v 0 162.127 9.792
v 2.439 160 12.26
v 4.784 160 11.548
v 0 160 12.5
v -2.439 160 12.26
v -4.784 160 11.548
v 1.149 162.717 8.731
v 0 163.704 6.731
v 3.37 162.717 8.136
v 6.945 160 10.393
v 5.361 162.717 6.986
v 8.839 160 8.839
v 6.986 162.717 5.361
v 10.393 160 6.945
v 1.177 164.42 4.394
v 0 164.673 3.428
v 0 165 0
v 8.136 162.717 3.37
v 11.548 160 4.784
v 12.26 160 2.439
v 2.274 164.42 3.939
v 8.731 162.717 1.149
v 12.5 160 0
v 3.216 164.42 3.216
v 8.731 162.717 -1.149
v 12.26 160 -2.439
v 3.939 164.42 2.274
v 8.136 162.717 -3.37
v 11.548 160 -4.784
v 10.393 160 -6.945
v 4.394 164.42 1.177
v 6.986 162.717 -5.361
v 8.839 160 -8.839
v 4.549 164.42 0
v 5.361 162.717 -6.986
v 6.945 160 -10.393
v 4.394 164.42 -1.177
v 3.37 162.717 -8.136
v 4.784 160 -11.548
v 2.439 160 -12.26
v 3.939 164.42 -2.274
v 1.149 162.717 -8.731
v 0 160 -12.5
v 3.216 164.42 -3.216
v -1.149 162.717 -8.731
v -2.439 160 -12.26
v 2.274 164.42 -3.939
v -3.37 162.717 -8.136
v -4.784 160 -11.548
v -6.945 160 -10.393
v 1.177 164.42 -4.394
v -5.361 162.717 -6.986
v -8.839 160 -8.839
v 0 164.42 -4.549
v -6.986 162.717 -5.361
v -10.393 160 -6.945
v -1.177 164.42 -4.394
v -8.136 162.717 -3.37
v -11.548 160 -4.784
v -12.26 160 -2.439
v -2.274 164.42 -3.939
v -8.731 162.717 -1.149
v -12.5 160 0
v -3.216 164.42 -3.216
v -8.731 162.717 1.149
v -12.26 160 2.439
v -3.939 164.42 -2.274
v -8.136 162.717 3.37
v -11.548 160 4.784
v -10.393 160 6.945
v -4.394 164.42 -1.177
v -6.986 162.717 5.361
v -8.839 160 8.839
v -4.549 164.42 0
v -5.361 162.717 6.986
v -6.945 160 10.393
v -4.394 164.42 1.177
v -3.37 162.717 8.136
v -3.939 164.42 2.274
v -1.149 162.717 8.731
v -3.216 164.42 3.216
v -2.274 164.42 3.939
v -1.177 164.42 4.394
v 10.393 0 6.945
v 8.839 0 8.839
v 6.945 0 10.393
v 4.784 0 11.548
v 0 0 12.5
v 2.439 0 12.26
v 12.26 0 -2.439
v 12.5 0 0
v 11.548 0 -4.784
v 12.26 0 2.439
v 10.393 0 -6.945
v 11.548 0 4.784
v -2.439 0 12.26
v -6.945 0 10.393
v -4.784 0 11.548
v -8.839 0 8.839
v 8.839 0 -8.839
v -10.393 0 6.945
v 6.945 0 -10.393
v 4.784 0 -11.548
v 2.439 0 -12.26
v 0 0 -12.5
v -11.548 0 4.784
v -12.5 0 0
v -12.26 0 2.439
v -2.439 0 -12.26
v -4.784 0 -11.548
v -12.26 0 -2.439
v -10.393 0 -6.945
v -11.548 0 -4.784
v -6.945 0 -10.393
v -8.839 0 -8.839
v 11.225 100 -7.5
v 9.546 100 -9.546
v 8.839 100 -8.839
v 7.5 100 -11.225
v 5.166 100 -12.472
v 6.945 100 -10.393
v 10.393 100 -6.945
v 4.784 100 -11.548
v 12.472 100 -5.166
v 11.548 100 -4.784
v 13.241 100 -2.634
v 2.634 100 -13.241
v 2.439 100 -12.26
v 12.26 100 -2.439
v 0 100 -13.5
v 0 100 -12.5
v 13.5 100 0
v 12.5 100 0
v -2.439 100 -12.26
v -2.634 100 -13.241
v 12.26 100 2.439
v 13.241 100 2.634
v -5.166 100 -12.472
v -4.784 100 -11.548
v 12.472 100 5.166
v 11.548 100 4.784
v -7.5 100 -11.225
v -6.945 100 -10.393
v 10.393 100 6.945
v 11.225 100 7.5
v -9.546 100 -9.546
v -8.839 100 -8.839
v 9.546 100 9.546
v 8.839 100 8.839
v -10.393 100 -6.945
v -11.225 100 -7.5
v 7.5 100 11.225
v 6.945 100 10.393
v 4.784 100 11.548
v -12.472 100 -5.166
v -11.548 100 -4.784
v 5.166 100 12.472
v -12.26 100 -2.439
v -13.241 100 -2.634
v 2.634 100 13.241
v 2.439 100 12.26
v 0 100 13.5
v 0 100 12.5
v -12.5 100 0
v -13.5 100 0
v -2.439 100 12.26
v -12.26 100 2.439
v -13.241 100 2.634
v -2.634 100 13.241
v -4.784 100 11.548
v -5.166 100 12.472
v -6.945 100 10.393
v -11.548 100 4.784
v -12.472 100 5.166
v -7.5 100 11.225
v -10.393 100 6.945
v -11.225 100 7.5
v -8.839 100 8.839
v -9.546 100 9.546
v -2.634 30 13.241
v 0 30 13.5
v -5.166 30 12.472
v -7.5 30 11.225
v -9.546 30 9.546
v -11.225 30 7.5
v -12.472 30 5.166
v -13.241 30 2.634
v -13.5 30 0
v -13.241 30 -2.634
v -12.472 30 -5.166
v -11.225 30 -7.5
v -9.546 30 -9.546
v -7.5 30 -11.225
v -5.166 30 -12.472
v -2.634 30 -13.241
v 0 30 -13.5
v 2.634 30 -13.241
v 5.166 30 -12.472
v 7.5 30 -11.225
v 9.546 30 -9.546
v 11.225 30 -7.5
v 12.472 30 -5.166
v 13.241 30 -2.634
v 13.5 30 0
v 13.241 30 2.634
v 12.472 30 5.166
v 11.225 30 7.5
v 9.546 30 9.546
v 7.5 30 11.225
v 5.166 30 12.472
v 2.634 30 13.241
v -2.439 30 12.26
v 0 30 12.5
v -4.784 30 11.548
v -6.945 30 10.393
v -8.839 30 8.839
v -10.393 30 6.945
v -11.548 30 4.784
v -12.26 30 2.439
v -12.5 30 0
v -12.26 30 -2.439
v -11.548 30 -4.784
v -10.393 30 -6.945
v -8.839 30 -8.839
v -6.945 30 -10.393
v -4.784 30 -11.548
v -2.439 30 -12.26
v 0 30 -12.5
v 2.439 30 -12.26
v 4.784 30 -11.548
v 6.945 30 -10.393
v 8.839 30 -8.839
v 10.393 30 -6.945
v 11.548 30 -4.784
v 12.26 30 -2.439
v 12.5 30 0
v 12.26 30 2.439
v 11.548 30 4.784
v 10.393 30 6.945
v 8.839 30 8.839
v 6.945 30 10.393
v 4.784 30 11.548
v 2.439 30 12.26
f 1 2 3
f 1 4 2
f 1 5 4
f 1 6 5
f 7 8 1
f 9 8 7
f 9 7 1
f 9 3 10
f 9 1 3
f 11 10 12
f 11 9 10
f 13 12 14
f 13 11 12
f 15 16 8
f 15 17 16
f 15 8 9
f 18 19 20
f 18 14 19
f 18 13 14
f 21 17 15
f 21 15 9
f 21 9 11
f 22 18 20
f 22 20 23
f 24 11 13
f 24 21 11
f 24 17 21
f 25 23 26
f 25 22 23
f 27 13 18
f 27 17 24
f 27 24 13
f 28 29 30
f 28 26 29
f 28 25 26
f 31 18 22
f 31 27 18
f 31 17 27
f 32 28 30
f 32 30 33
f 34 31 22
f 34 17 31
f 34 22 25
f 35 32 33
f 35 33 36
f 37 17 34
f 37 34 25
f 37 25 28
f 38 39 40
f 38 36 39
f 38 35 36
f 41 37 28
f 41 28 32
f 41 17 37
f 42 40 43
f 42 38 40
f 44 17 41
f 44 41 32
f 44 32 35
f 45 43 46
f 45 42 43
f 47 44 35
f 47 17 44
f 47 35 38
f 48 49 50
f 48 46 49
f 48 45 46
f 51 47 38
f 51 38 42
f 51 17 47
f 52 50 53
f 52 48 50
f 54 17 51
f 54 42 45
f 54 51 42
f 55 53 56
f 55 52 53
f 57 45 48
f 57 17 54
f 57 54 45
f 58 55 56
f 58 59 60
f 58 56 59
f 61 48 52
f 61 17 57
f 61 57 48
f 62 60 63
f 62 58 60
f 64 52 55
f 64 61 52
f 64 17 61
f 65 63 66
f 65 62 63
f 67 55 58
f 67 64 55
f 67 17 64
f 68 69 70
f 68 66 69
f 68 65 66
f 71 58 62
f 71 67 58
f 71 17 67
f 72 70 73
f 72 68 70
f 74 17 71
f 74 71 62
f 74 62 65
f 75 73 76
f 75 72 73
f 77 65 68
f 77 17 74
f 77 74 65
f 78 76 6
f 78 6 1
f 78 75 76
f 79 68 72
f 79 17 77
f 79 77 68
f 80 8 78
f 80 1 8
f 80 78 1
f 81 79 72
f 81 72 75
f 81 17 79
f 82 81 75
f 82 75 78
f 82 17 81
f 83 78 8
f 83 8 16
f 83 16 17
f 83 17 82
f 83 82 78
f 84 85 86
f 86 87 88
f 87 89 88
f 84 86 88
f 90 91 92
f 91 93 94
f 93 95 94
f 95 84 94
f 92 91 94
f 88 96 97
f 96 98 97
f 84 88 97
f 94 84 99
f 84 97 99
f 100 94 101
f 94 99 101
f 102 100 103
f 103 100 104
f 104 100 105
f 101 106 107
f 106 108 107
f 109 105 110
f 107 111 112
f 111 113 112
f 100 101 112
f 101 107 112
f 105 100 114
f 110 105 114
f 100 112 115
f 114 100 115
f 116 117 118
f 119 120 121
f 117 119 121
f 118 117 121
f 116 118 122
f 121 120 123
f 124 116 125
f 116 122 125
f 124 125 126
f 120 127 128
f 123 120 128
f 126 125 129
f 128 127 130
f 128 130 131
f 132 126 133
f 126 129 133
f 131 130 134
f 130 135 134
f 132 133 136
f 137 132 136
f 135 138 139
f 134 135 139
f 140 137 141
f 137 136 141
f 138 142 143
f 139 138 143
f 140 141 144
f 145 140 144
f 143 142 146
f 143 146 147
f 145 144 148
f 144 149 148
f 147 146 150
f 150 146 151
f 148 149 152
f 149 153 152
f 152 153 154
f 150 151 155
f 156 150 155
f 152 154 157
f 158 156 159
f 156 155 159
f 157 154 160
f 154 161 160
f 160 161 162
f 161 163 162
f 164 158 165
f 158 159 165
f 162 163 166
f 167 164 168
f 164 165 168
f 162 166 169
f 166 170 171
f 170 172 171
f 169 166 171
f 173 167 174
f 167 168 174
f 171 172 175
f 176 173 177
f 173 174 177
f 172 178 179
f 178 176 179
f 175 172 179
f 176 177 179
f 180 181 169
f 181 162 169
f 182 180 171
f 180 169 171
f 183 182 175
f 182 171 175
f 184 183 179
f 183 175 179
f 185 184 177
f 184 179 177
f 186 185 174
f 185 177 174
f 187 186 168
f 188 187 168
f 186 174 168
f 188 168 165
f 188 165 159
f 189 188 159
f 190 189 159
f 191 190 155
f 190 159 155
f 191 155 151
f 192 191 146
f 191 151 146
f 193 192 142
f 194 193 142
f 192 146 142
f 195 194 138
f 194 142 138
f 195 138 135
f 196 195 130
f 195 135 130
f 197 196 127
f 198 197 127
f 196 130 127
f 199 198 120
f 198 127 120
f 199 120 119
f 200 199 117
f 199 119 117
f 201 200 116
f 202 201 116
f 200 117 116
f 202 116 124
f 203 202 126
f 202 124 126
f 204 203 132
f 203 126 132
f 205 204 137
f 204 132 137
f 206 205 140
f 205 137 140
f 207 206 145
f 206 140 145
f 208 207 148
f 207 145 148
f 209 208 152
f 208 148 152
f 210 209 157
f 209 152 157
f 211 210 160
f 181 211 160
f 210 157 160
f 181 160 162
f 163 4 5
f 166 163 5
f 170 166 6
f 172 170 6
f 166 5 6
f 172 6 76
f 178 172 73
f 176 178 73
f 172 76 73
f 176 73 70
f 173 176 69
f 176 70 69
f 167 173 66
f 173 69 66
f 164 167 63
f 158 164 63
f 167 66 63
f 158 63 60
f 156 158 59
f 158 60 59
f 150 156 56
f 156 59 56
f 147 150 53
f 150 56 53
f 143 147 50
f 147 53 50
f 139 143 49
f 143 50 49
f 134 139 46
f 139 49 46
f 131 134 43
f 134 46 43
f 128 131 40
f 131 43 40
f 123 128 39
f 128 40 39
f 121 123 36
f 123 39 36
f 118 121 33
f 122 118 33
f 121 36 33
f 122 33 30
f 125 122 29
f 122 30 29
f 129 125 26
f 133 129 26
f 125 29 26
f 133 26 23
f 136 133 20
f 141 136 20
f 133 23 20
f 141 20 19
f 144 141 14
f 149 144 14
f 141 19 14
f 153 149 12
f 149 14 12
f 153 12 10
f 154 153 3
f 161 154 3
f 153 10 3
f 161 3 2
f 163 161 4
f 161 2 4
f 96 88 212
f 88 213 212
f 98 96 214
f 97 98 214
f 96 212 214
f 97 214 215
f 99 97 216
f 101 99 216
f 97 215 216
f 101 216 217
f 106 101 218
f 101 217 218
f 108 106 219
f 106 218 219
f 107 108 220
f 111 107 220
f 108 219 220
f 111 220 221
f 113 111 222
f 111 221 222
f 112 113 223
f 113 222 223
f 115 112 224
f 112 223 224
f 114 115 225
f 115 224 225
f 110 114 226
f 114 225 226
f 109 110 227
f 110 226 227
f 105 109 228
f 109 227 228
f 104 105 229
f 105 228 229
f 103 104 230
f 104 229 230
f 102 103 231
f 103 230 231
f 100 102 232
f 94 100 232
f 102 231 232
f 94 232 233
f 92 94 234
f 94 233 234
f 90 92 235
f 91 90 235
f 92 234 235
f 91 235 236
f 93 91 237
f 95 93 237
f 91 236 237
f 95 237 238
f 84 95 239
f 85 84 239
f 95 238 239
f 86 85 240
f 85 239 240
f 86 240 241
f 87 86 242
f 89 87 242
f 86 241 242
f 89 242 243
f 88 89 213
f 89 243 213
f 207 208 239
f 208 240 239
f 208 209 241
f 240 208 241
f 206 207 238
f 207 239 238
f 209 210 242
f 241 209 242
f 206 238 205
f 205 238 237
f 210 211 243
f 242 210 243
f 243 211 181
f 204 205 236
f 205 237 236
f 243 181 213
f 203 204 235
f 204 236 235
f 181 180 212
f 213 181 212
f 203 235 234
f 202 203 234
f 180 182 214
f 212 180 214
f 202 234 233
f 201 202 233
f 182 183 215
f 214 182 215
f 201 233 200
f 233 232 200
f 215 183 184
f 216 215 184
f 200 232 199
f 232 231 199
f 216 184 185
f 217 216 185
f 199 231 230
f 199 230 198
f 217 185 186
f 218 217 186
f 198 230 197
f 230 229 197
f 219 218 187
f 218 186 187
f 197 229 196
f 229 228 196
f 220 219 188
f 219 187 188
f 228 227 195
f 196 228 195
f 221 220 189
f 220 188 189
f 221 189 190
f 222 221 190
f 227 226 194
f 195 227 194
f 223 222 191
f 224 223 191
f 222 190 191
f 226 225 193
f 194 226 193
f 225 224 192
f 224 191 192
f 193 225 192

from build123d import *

# Parameters (mm, degrees)
DOME1_FACE_RADIUS = 12.5
DOME1_HEIGHT      = 5


with BuildPart() as part:
    # Sketch1 → Revolve2 (revolve)
    with BuildSketch(Plane.XY, mode=Mode.PRIVATE) as revolve2_sk:
        Polygon((0, 0), (-12.5, 0), (-12.5, 30), (-13.5, 30), (-13.5, 100), (-12.5, 100), (-12.5, 160), (0, 160), align=None)
    revolve(revolve2_sk.sketch.rotate(Axis((0, 160, 0), (0, -1, 0)), 270), axis=Axis((0, 160, 0), (0, -1, 0)))

    # Dome1: a dome of height H over a round flat face of radius A is a cap of a sphere of radius (A * A + H * H) / (2 * H)
    dome1_r = (DOME1_FACE_RADIUS * DOME1_FACE_RADIUS + DOME1_HEIGHT * DOME1_HEIGHT) / (2 * DOME1_HEIGHT)
    dome1_base = Plane((0, 160, 0), z_dir=(0, 1, 0))
    with Locations(dome1_base.offset(DOME1_HEIGHT - dome1_r)):
        dome1_ball = Sphere(dome1_r, mode=Mode.PRIVATE)
    add(split(dome1_ball, bisect_by=dome1_base, keep=Keep.TOP, mode=Mode.PRIVATE))


solid = part.part
